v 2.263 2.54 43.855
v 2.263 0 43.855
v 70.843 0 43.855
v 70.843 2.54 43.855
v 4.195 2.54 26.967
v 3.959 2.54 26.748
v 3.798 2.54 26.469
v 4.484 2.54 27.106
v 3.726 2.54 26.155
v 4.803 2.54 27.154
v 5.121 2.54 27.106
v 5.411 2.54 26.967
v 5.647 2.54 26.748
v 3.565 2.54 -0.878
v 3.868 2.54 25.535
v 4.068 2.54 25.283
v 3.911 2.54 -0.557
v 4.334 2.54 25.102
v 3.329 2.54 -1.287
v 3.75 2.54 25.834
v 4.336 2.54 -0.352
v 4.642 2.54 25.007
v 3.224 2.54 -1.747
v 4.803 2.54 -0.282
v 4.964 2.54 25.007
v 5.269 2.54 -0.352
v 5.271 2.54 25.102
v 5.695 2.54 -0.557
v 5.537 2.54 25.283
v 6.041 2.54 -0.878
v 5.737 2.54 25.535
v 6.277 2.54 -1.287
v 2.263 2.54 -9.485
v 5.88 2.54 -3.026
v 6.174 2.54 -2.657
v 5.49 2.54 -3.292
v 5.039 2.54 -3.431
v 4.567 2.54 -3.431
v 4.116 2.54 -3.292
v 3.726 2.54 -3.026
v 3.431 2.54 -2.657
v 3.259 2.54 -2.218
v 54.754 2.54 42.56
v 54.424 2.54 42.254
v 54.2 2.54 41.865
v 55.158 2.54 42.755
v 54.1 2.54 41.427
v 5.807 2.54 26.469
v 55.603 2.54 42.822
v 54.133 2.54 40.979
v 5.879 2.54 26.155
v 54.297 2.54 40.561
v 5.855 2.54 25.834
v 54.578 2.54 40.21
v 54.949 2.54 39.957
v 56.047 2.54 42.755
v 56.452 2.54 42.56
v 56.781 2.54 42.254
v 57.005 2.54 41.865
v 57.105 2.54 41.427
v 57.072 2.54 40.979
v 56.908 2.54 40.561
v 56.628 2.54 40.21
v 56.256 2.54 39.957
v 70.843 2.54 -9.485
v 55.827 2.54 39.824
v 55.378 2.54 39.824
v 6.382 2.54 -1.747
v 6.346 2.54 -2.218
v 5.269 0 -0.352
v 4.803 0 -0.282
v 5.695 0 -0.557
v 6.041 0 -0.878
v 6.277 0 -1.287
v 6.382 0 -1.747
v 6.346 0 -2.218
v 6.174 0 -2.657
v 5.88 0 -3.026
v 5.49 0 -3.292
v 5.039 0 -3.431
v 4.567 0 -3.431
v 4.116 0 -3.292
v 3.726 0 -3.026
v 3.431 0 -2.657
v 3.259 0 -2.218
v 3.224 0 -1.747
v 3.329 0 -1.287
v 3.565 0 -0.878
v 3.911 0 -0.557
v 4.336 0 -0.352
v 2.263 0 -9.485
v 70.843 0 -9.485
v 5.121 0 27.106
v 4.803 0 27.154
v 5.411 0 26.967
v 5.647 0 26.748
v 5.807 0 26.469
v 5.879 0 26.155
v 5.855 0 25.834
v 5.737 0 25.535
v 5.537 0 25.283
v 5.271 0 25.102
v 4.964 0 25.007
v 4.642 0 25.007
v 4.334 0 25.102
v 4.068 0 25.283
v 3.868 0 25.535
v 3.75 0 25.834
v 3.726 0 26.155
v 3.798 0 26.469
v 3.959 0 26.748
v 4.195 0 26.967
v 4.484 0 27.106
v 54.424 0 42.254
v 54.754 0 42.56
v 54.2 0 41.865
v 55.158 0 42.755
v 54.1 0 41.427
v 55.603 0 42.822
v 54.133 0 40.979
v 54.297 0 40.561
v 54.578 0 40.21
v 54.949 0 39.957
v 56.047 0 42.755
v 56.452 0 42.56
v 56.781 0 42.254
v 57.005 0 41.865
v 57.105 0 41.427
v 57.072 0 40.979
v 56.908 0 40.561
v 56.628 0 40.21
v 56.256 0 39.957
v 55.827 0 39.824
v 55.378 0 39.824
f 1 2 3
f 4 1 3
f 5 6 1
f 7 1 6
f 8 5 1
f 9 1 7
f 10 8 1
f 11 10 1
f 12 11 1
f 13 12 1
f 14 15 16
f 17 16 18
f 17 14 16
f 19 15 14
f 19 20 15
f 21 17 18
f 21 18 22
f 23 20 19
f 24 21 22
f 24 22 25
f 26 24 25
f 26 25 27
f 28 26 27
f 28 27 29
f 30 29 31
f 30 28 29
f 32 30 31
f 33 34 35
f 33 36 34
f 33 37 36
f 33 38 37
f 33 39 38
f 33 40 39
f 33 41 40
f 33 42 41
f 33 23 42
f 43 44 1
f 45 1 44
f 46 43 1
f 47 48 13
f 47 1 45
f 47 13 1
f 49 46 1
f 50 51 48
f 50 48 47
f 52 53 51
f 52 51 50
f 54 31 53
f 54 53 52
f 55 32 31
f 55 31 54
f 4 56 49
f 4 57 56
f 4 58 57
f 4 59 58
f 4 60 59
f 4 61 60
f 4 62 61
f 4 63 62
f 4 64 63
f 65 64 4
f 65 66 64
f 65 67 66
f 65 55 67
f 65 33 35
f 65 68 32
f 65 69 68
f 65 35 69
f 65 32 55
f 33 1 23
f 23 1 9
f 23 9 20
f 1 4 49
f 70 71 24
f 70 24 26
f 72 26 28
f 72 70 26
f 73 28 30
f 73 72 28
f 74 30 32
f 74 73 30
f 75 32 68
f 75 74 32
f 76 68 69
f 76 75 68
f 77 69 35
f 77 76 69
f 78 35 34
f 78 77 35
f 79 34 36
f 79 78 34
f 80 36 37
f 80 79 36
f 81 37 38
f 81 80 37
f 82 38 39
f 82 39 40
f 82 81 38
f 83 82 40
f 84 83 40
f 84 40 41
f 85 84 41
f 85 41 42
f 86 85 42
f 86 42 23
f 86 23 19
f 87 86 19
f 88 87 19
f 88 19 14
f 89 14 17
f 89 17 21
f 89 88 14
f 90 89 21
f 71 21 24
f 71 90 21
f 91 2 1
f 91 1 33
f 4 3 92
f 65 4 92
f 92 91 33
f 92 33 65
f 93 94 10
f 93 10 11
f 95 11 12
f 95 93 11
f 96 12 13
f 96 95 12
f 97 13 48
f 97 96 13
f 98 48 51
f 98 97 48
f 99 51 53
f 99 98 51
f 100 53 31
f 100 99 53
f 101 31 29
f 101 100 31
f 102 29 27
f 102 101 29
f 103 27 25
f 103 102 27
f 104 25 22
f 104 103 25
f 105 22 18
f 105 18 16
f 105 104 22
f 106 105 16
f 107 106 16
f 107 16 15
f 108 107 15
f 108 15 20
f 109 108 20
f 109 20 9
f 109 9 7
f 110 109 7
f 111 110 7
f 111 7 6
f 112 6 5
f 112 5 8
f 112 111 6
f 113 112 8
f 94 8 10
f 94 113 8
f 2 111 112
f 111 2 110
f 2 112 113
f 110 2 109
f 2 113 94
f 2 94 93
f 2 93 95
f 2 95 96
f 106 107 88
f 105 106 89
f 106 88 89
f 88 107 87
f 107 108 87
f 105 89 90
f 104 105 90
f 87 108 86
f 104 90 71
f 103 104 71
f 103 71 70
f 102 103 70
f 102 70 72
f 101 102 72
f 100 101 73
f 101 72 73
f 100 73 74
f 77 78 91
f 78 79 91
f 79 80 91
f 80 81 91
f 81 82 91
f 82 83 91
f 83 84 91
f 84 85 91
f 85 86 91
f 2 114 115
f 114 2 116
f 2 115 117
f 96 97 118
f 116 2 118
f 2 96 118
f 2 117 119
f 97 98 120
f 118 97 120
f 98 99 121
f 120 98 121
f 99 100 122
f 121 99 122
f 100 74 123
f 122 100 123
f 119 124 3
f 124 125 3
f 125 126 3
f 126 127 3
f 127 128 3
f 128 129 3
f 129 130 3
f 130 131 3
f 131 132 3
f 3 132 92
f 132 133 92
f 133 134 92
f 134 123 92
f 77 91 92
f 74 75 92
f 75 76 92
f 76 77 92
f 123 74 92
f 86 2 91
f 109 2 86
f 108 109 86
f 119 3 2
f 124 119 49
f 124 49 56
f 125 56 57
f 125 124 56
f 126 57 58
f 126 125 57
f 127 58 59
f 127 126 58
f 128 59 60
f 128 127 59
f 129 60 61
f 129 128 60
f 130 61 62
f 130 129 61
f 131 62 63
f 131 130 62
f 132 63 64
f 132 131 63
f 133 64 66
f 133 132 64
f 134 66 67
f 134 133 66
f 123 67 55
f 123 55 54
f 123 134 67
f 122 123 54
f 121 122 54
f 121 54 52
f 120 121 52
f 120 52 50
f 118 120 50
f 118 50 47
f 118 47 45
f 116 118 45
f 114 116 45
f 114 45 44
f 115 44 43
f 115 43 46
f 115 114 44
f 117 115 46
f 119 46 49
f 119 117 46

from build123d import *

# Parameters (mm, degrees)
SKETCH2_W      = 68.58
SKETCH2_H      = 53.34
SKETCH2_R      = 1.58353158
SKETCH2_R_2    = 1.50705101
SKETCH2_R_3    = 1.0795
EXTRUDE1_DEPTH = 2.54


with BuildPart() as part:
    # Sketch2 → Extrude1 (new body)
    with BuildSketch(Plane(origin=(0, 0, 0), x_dir=(1, 0, 0), z_dir=(0, 1, 0))):
        with Locations((36.552617603, -17.1846875)):
            Rectangle(SKETCH2_W, SKETCH2_H)
        with Locations(Location((4.802617603, 1.8653125, 0), (0, 0, 270))):
            Circle(SKETCH2_R, mode=Mode.SUBTRACT)
        with Locations(Location((55.602566803, -41.3146875, 0), (0, 0, 270))):
            Circle(SKETCH2_R_2, mode=Mode.SUBTRACT)
        with Locations(Location((4.802617603, -26.0746875, 0), (0, 0, 270))):
            Circle(SKETCH2_R_3, mode=Mode.SUBTRACT)
    extrude(amount=EXTRUDE1_DEPTH)


solid = part.part
